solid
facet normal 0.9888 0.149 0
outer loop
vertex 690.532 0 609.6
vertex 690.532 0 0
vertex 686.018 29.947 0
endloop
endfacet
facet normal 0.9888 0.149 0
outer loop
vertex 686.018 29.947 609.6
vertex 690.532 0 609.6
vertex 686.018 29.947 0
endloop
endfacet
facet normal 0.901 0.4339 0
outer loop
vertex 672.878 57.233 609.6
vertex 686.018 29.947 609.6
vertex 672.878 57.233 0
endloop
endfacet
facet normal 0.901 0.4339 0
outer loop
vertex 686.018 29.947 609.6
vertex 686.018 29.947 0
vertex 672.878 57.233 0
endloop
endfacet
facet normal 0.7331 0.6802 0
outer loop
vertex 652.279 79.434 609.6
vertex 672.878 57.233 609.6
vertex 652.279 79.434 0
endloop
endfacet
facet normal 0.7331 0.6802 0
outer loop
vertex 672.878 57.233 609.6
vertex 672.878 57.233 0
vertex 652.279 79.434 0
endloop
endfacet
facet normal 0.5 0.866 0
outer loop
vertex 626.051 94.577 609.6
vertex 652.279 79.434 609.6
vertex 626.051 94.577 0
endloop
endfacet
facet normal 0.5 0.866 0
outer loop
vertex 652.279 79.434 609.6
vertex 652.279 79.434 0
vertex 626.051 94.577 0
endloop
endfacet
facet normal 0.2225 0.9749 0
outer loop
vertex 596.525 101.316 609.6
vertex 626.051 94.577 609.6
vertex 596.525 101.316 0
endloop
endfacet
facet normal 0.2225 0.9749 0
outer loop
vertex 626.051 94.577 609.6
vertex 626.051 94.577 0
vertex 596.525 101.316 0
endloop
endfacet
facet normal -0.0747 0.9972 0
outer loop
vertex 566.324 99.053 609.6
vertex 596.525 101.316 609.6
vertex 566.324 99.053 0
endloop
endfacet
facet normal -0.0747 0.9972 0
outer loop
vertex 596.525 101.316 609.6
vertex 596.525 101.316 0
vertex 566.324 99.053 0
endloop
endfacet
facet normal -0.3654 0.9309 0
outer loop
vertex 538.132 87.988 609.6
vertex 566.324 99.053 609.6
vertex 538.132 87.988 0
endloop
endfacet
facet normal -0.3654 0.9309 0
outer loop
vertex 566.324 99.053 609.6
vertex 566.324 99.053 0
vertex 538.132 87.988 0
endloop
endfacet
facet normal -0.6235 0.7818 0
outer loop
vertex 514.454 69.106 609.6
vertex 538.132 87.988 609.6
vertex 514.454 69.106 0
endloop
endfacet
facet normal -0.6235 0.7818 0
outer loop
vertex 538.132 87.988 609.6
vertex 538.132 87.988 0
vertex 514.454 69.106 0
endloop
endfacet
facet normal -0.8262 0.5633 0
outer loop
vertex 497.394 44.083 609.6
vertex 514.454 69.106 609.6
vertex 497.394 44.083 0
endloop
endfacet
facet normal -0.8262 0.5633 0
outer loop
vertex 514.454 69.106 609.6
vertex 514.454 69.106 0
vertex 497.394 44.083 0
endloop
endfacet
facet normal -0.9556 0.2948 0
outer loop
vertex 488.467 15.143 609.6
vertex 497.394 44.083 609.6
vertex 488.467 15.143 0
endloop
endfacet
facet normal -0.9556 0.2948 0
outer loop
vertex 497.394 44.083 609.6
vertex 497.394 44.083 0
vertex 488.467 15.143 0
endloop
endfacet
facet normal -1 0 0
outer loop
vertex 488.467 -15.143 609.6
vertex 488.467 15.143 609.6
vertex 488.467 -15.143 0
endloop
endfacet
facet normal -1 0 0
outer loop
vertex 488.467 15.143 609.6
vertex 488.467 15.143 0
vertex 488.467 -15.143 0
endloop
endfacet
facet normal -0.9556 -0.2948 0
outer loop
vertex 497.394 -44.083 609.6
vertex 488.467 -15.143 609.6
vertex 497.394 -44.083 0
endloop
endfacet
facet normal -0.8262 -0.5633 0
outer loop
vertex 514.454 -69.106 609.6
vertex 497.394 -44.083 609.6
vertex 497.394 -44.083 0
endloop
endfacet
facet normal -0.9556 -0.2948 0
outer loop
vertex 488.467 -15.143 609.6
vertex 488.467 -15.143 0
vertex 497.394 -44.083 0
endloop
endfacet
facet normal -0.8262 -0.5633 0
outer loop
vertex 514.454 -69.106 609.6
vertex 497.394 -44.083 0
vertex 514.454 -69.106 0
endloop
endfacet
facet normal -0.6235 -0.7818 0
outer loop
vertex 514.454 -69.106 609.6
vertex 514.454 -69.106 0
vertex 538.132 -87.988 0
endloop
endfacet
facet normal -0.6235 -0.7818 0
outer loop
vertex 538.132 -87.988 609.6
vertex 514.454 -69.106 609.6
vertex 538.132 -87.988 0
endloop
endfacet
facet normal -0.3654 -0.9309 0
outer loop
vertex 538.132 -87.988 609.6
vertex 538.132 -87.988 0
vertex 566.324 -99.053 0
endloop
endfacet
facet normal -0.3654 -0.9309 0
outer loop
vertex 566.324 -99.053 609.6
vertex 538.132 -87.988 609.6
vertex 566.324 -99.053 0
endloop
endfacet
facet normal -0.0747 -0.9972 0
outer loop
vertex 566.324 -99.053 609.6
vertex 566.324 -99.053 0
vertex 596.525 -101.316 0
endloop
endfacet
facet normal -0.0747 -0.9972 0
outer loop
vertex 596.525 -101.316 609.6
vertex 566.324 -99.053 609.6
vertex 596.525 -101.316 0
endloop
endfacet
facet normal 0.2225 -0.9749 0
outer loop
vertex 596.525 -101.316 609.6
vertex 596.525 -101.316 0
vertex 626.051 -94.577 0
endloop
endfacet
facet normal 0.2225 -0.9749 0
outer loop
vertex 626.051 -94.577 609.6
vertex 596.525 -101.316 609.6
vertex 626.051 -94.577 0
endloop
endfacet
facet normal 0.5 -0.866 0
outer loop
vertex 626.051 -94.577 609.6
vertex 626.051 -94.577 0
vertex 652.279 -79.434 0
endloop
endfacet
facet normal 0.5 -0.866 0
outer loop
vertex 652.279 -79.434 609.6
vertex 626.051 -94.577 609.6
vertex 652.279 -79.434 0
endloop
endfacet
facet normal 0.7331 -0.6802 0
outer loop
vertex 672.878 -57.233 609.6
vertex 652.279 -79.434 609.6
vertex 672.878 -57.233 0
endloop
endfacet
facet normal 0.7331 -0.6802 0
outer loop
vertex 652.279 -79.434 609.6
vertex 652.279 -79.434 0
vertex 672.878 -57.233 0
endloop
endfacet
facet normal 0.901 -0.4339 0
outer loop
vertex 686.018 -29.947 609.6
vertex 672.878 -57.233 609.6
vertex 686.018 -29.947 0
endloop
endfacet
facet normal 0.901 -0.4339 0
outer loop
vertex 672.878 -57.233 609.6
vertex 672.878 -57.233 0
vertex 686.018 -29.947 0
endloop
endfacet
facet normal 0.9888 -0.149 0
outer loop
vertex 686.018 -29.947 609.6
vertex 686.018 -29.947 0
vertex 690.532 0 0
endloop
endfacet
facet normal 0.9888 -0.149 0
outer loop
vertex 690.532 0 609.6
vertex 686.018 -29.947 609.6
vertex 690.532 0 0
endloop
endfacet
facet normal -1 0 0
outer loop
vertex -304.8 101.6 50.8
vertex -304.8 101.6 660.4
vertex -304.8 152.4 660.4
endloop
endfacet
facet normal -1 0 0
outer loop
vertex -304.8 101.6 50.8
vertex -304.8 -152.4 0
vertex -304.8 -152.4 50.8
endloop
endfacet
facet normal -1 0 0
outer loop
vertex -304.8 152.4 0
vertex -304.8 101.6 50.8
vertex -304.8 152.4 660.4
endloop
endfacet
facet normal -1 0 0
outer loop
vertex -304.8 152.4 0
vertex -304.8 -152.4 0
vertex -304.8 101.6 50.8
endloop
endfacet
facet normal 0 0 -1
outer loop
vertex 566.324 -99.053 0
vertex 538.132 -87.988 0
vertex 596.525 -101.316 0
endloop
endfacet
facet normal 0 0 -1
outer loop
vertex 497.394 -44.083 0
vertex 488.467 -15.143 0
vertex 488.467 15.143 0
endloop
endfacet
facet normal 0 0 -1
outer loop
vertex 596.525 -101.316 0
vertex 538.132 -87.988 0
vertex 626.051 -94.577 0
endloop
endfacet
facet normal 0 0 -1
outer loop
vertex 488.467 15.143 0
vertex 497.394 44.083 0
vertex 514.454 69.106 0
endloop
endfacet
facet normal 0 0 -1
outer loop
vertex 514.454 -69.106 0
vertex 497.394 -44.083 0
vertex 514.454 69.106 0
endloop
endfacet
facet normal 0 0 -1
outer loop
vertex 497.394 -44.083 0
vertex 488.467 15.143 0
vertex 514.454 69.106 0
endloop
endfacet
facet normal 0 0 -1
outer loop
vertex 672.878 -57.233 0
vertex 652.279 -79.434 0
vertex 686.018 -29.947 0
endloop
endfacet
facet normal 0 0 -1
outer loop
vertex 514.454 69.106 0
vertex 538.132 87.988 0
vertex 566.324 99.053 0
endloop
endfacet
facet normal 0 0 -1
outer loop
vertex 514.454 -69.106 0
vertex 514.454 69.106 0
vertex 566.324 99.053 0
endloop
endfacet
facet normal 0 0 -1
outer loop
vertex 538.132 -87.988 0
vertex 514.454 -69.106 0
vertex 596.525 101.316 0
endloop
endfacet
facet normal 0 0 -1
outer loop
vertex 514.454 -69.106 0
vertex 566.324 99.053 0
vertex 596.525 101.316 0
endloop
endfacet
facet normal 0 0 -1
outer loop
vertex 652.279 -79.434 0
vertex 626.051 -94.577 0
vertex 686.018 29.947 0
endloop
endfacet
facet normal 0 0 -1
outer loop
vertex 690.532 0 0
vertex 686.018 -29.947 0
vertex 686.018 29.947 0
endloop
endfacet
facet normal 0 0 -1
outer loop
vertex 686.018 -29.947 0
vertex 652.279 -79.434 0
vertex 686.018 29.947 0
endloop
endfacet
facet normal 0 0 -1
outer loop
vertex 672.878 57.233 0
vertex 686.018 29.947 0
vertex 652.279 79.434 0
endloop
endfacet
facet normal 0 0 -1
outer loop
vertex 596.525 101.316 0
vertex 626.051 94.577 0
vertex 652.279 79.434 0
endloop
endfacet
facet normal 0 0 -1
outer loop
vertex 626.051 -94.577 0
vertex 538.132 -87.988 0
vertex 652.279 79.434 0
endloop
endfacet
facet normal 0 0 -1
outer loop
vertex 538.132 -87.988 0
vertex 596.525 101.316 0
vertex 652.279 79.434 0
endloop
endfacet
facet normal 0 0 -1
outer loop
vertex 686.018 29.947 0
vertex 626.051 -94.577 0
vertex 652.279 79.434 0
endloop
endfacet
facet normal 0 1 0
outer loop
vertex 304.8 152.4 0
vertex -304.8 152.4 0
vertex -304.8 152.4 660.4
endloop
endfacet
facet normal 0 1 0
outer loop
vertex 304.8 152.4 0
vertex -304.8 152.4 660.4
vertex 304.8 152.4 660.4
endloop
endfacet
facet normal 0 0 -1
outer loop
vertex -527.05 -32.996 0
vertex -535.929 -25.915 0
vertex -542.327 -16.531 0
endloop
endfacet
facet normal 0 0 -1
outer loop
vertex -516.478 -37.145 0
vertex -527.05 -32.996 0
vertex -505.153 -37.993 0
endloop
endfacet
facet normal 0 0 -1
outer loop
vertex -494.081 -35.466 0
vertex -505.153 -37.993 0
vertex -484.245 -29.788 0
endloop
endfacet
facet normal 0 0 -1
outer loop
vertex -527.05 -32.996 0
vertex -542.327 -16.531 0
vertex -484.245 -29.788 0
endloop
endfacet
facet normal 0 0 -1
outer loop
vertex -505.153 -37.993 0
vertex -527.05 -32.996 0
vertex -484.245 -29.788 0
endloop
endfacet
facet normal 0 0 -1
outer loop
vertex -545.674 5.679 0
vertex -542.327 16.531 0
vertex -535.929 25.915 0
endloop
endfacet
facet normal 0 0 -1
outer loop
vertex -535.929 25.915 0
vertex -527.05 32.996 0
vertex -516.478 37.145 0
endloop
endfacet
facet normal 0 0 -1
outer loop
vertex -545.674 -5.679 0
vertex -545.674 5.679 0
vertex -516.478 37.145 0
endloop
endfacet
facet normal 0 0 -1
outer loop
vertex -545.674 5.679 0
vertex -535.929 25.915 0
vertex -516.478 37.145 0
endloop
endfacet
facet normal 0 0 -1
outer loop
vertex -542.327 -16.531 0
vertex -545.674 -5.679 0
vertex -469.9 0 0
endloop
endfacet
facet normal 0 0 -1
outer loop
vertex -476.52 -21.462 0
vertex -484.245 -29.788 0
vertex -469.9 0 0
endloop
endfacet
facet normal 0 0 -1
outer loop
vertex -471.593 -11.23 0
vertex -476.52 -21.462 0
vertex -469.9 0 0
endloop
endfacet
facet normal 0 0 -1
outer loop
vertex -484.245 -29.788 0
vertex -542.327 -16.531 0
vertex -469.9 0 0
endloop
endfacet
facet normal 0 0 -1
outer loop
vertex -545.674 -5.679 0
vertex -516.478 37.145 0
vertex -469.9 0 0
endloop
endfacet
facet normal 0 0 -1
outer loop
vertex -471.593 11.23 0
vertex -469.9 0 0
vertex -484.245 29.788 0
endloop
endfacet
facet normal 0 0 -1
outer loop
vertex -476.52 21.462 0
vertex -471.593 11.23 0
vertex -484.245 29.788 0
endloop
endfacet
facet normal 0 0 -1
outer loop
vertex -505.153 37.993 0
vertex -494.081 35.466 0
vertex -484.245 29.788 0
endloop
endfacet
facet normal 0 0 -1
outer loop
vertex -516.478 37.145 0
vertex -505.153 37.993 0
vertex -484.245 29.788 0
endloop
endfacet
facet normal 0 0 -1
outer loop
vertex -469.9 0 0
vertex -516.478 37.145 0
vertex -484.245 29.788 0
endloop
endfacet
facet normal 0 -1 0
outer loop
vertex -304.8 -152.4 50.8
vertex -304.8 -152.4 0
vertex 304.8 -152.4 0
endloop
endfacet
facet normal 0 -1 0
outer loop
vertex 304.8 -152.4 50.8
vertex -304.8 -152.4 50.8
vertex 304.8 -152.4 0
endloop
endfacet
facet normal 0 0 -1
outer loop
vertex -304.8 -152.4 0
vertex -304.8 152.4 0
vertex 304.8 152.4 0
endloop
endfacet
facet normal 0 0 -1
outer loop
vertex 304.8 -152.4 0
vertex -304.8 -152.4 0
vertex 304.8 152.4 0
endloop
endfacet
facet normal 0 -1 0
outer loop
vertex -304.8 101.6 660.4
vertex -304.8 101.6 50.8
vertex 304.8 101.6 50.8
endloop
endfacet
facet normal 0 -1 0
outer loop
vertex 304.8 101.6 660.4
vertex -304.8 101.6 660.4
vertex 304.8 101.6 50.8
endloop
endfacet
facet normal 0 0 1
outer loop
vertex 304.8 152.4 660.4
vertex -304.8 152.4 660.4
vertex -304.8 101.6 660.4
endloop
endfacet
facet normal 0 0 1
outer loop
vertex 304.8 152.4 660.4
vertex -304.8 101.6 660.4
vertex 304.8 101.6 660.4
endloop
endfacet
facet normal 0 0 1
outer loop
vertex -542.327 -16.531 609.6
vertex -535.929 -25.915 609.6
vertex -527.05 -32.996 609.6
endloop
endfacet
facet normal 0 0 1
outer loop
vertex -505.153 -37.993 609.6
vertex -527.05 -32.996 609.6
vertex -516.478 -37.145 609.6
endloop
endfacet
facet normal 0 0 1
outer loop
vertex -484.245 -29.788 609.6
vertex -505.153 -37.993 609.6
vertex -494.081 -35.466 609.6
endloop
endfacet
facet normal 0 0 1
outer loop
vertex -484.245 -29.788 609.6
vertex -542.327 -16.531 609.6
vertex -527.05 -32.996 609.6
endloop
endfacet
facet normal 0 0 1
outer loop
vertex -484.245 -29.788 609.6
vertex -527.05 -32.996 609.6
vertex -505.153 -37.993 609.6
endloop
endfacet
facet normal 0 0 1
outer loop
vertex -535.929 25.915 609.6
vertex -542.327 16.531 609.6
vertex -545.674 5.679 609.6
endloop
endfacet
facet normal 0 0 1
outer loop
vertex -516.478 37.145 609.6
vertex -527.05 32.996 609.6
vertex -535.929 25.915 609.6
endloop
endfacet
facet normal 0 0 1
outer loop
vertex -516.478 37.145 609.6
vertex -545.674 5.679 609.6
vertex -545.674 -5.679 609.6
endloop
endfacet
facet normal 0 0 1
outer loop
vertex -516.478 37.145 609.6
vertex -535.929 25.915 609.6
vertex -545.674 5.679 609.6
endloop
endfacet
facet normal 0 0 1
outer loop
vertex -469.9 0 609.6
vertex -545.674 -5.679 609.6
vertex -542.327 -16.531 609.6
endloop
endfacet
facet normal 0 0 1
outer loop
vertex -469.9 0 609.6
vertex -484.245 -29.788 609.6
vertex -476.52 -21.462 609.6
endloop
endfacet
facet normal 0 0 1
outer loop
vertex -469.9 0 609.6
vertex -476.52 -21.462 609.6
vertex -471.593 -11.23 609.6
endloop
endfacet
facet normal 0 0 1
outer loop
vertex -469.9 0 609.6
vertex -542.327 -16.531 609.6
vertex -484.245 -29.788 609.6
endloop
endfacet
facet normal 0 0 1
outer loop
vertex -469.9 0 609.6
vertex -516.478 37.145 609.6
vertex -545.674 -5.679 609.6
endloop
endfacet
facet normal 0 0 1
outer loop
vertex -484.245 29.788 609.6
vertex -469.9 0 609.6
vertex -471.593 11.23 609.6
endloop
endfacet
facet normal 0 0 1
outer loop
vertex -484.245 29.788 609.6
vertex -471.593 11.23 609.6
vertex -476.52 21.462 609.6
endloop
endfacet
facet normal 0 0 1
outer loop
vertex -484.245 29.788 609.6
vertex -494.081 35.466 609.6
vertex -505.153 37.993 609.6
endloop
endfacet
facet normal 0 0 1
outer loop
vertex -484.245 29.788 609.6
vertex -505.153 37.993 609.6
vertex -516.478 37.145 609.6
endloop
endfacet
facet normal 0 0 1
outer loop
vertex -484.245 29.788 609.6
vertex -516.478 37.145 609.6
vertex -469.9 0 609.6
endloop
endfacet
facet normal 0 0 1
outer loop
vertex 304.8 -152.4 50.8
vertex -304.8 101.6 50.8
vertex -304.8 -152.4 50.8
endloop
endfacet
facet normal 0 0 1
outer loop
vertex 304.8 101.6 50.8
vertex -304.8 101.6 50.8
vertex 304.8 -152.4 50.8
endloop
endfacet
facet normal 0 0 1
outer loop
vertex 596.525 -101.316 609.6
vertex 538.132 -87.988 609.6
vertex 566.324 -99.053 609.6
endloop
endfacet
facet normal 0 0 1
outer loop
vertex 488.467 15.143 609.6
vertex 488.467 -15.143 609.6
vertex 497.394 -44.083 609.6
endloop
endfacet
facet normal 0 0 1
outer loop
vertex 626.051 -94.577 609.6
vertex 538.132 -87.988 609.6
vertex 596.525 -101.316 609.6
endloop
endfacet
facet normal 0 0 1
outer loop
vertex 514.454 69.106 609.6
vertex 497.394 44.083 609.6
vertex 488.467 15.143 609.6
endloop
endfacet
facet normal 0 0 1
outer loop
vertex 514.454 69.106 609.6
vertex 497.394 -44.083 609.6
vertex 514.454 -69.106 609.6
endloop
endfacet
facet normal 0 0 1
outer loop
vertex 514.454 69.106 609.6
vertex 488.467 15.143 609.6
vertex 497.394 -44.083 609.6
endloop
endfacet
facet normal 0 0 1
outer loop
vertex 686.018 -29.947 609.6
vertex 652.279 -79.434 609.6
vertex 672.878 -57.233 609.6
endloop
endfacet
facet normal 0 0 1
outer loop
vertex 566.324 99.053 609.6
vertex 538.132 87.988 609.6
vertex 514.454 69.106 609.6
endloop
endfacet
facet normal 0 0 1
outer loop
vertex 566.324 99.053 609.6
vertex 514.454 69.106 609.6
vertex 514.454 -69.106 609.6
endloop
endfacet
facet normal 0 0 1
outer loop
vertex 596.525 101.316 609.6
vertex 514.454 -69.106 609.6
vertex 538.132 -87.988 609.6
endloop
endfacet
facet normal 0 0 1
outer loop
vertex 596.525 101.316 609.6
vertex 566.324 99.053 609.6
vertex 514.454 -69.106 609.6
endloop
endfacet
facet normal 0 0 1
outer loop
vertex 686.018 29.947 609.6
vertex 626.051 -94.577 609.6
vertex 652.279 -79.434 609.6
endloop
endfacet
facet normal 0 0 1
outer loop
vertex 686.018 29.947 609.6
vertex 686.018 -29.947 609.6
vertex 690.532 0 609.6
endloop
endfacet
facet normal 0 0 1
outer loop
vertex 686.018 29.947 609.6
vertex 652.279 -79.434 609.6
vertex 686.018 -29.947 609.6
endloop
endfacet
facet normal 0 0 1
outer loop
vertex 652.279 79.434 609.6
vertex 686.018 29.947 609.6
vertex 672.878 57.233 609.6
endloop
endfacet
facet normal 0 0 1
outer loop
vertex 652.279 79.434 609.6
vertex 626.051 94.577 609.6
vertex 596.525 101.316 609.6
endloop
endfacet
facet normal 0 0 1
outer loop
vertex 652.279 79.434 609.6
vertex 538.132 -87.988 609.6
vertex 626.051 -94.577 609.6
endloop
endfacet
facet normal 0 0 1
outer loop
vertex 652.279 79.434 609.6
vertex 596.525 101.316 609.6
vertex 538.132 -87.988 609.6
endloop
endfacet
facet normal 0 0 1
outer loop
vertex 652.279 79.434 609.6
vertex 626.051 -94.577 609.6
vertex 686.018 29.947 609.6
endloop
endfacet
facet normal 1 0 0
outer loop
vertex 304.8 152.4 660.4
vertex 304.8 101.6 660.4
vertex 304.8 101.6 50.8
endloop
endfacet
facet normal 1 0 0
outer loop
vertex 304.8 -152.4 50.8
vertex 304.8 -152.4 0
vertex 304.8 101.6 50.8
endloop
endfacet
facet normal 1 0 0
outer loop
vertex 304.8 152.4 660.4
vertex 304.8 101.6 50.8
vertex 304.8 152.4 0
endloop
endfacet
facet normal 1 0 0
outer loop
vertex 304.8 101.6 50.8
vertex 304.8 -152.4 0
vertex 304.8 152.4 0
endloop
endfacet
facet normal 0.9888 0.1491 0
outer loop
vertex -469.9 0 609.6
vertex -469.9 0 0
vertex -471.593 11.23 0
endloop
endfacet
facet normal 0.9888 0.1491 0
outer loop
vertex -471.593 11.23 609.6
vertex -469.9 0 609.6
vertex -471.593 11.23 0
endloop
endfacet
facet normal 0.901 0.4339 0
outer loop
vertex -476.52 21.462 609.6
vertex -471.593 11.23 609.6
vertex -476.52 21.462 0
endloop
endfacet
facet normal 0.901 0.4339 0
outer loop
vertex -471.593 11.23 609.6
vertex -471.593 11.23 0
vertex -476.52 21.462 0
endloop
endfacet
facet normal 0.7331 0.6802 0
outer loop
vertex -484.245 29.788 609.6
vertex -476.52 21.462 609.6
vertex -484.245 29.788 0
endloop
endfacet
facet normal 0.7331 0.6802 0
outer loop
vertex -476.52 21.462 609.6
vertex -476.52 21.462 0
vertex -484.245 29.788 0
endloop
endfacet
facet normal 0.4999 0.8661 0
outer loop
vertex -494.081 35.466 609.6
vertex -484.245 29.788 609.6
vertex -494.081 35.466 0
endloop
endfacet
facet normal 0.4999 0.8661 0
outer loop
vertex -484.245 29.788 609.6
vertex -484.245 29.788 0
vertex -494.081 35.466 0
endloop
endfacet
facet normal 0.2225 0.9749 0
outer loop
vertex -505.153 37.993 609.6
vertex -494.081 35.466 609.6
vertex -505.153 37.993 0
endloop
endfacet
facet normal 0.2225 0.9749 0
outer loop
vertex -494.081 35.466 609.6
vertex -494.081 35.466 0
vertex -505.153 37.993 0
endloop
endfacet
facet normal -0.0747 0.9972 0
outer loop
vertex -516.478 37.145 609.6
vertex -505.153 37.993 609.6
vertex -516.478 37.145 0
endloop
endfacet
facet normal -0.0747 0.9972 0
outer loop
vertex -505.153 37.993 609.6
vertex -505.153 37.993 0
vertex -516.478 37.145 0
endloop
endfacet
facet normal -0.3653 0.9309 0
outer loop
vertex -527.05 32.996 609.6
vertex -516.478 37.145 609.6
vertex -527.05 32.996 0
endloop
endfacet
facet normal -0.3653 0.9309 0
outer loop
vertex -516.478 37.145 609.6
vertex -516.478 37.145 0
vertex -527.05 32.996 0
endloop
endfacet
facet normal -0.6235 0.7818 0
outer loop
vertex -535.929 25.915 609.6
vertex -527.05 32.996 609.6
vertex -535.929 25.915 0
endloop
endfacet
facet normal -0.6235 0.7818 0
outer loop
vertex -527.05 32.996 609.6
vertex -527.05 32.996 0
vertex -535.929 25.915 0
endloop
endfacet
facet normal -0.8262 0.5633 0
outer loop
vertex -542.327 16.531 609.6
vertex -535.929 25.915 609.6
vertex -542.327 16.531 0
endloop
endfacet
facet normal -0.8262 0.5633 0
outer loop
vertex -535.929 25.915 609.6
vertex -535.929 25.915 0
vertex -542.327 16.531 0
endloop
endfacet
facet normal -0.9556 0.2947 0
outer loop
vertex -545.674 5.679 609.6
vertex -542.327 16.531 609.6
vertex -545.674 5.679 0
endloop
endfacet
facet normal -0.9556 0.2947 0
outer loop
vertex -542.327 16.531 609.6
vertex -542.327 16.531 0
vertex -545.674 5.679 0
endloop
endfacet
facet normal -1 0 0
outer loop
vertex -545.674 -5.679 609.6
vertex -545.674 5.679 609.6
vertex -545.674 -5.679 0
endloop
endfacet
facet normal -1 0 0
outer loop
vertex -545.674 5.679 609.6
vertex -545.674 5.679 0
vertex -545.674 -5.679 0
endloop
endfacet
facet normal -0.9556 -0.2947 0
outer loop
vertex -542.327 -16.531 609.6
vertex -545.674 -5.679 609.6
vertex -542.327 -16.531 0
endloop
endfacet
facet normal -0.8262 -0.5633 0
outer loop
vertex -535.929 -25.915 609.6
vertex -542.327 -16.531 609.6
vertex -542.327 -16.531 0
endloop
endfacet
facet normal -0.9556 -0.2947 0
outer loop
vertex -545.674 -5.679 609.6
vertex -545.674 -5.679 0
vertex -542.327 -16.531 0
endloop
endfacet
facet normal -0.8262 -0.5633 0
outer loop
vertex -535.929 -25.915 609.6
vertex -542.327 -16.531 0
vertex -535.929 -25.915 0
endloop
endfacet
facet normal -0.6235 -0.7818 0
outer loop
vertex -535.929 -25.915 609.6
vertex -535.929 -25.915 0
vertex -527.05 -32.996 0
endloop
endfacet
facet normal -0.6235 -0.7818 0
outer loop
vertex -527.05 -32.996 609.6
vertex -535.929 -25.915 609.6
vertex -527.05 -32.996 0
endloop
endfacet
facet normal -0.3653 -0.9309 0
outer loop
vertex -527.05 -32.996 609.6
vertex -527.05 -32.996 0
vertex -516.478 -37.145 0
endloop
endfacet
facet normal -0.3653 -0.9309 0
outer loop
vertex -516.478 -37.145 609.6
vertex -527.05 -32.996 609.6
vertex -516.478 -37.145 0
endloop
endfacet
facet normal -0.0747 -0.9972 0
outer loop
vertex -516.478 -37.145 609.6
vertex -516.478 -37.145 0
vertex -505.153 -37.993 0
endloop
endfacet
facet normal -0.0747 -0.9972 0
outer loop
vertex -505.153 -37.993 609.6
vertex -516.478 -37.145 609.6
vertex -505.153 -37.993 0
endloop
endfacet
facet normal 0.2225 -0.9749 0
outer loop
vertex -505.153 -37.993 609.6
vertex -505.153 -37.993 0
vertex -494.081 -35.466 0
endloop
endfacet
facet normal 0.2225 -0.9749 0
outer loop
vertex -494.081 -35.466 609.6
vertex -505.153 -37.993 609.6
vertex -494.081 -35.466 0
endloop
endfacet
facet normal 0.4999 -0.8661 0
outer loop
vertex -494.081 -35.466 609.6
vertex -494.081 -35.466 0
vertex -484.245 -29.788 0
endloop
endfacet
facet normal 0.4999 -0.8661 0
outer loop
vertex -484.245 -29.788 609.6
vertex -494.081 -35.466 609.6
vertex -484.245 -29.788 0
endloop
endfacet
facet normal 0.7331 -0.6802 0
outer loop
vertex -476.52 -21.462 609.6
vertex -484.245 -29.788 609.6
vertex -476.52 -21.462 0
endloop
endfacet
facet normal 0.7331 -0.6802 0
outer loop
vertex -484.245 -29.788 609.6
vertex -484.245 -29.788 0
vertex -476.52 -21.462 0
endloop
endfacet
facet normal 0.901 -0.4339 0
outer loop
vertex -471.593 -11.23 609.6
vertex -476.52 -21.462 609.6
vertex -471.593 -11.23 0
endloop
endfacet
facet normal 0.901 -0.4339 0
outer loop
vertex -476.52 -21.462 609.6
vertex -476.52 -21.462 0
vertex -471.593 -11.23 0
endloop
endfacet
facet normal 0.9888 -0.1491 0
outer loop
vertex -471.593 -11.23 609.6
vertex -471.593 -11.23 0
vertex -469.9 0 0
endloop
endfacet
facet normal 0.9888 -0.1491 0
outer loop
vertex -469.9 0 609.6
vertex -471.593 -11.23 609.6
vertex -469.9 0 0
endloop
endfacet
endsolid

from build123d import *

# Parameters (mm, degrees)
F0_W     = 609.6
F0_H     = 304.8
F1_DEPTH = 50.8
F2_W     = 609.6
F2_H     = 50.8
F3_DEPTH = 609.6
F4_R     = 101.6
F5_DEPTH = 609.6
F6_R     = 38.1
F7_DEPTH = 609.6


with BuildPart() as f1:
    # F0 (on Top) → F1 (new body)
    with BuildSketch(Plane.XY):
        Rectangle(F0_W, F0_H)
    extrude(amount=F1_DEPTH)

    # F2 (on face) → F3 (join)
    with BuildSketch(Plane.XY.offset(50.8)):
        with Locations((0, 127)):
            Rectangle(F2_W, F2_H)
    extrude(amount=F3_DEPTH)


with BuildPart() as f5:
    # F4 (on Top) → F5 (new body)
    with BuildSketch(Plane.XY):
        with Locations((588.93214, 0)):
            Circle(F4_R)
    extrude(amount=F5_DEPTH)


with BuildPart() as f7:
    # F6 (on Top) → F7 (new body)
    with BuildSketch(Plane.XY):
        with Locations((-508, 0)):
            Circle(F6_R)
    extrude(amount=F7_DEPTH)


solid = Compound([f1.part, f5.part, f7.part])
